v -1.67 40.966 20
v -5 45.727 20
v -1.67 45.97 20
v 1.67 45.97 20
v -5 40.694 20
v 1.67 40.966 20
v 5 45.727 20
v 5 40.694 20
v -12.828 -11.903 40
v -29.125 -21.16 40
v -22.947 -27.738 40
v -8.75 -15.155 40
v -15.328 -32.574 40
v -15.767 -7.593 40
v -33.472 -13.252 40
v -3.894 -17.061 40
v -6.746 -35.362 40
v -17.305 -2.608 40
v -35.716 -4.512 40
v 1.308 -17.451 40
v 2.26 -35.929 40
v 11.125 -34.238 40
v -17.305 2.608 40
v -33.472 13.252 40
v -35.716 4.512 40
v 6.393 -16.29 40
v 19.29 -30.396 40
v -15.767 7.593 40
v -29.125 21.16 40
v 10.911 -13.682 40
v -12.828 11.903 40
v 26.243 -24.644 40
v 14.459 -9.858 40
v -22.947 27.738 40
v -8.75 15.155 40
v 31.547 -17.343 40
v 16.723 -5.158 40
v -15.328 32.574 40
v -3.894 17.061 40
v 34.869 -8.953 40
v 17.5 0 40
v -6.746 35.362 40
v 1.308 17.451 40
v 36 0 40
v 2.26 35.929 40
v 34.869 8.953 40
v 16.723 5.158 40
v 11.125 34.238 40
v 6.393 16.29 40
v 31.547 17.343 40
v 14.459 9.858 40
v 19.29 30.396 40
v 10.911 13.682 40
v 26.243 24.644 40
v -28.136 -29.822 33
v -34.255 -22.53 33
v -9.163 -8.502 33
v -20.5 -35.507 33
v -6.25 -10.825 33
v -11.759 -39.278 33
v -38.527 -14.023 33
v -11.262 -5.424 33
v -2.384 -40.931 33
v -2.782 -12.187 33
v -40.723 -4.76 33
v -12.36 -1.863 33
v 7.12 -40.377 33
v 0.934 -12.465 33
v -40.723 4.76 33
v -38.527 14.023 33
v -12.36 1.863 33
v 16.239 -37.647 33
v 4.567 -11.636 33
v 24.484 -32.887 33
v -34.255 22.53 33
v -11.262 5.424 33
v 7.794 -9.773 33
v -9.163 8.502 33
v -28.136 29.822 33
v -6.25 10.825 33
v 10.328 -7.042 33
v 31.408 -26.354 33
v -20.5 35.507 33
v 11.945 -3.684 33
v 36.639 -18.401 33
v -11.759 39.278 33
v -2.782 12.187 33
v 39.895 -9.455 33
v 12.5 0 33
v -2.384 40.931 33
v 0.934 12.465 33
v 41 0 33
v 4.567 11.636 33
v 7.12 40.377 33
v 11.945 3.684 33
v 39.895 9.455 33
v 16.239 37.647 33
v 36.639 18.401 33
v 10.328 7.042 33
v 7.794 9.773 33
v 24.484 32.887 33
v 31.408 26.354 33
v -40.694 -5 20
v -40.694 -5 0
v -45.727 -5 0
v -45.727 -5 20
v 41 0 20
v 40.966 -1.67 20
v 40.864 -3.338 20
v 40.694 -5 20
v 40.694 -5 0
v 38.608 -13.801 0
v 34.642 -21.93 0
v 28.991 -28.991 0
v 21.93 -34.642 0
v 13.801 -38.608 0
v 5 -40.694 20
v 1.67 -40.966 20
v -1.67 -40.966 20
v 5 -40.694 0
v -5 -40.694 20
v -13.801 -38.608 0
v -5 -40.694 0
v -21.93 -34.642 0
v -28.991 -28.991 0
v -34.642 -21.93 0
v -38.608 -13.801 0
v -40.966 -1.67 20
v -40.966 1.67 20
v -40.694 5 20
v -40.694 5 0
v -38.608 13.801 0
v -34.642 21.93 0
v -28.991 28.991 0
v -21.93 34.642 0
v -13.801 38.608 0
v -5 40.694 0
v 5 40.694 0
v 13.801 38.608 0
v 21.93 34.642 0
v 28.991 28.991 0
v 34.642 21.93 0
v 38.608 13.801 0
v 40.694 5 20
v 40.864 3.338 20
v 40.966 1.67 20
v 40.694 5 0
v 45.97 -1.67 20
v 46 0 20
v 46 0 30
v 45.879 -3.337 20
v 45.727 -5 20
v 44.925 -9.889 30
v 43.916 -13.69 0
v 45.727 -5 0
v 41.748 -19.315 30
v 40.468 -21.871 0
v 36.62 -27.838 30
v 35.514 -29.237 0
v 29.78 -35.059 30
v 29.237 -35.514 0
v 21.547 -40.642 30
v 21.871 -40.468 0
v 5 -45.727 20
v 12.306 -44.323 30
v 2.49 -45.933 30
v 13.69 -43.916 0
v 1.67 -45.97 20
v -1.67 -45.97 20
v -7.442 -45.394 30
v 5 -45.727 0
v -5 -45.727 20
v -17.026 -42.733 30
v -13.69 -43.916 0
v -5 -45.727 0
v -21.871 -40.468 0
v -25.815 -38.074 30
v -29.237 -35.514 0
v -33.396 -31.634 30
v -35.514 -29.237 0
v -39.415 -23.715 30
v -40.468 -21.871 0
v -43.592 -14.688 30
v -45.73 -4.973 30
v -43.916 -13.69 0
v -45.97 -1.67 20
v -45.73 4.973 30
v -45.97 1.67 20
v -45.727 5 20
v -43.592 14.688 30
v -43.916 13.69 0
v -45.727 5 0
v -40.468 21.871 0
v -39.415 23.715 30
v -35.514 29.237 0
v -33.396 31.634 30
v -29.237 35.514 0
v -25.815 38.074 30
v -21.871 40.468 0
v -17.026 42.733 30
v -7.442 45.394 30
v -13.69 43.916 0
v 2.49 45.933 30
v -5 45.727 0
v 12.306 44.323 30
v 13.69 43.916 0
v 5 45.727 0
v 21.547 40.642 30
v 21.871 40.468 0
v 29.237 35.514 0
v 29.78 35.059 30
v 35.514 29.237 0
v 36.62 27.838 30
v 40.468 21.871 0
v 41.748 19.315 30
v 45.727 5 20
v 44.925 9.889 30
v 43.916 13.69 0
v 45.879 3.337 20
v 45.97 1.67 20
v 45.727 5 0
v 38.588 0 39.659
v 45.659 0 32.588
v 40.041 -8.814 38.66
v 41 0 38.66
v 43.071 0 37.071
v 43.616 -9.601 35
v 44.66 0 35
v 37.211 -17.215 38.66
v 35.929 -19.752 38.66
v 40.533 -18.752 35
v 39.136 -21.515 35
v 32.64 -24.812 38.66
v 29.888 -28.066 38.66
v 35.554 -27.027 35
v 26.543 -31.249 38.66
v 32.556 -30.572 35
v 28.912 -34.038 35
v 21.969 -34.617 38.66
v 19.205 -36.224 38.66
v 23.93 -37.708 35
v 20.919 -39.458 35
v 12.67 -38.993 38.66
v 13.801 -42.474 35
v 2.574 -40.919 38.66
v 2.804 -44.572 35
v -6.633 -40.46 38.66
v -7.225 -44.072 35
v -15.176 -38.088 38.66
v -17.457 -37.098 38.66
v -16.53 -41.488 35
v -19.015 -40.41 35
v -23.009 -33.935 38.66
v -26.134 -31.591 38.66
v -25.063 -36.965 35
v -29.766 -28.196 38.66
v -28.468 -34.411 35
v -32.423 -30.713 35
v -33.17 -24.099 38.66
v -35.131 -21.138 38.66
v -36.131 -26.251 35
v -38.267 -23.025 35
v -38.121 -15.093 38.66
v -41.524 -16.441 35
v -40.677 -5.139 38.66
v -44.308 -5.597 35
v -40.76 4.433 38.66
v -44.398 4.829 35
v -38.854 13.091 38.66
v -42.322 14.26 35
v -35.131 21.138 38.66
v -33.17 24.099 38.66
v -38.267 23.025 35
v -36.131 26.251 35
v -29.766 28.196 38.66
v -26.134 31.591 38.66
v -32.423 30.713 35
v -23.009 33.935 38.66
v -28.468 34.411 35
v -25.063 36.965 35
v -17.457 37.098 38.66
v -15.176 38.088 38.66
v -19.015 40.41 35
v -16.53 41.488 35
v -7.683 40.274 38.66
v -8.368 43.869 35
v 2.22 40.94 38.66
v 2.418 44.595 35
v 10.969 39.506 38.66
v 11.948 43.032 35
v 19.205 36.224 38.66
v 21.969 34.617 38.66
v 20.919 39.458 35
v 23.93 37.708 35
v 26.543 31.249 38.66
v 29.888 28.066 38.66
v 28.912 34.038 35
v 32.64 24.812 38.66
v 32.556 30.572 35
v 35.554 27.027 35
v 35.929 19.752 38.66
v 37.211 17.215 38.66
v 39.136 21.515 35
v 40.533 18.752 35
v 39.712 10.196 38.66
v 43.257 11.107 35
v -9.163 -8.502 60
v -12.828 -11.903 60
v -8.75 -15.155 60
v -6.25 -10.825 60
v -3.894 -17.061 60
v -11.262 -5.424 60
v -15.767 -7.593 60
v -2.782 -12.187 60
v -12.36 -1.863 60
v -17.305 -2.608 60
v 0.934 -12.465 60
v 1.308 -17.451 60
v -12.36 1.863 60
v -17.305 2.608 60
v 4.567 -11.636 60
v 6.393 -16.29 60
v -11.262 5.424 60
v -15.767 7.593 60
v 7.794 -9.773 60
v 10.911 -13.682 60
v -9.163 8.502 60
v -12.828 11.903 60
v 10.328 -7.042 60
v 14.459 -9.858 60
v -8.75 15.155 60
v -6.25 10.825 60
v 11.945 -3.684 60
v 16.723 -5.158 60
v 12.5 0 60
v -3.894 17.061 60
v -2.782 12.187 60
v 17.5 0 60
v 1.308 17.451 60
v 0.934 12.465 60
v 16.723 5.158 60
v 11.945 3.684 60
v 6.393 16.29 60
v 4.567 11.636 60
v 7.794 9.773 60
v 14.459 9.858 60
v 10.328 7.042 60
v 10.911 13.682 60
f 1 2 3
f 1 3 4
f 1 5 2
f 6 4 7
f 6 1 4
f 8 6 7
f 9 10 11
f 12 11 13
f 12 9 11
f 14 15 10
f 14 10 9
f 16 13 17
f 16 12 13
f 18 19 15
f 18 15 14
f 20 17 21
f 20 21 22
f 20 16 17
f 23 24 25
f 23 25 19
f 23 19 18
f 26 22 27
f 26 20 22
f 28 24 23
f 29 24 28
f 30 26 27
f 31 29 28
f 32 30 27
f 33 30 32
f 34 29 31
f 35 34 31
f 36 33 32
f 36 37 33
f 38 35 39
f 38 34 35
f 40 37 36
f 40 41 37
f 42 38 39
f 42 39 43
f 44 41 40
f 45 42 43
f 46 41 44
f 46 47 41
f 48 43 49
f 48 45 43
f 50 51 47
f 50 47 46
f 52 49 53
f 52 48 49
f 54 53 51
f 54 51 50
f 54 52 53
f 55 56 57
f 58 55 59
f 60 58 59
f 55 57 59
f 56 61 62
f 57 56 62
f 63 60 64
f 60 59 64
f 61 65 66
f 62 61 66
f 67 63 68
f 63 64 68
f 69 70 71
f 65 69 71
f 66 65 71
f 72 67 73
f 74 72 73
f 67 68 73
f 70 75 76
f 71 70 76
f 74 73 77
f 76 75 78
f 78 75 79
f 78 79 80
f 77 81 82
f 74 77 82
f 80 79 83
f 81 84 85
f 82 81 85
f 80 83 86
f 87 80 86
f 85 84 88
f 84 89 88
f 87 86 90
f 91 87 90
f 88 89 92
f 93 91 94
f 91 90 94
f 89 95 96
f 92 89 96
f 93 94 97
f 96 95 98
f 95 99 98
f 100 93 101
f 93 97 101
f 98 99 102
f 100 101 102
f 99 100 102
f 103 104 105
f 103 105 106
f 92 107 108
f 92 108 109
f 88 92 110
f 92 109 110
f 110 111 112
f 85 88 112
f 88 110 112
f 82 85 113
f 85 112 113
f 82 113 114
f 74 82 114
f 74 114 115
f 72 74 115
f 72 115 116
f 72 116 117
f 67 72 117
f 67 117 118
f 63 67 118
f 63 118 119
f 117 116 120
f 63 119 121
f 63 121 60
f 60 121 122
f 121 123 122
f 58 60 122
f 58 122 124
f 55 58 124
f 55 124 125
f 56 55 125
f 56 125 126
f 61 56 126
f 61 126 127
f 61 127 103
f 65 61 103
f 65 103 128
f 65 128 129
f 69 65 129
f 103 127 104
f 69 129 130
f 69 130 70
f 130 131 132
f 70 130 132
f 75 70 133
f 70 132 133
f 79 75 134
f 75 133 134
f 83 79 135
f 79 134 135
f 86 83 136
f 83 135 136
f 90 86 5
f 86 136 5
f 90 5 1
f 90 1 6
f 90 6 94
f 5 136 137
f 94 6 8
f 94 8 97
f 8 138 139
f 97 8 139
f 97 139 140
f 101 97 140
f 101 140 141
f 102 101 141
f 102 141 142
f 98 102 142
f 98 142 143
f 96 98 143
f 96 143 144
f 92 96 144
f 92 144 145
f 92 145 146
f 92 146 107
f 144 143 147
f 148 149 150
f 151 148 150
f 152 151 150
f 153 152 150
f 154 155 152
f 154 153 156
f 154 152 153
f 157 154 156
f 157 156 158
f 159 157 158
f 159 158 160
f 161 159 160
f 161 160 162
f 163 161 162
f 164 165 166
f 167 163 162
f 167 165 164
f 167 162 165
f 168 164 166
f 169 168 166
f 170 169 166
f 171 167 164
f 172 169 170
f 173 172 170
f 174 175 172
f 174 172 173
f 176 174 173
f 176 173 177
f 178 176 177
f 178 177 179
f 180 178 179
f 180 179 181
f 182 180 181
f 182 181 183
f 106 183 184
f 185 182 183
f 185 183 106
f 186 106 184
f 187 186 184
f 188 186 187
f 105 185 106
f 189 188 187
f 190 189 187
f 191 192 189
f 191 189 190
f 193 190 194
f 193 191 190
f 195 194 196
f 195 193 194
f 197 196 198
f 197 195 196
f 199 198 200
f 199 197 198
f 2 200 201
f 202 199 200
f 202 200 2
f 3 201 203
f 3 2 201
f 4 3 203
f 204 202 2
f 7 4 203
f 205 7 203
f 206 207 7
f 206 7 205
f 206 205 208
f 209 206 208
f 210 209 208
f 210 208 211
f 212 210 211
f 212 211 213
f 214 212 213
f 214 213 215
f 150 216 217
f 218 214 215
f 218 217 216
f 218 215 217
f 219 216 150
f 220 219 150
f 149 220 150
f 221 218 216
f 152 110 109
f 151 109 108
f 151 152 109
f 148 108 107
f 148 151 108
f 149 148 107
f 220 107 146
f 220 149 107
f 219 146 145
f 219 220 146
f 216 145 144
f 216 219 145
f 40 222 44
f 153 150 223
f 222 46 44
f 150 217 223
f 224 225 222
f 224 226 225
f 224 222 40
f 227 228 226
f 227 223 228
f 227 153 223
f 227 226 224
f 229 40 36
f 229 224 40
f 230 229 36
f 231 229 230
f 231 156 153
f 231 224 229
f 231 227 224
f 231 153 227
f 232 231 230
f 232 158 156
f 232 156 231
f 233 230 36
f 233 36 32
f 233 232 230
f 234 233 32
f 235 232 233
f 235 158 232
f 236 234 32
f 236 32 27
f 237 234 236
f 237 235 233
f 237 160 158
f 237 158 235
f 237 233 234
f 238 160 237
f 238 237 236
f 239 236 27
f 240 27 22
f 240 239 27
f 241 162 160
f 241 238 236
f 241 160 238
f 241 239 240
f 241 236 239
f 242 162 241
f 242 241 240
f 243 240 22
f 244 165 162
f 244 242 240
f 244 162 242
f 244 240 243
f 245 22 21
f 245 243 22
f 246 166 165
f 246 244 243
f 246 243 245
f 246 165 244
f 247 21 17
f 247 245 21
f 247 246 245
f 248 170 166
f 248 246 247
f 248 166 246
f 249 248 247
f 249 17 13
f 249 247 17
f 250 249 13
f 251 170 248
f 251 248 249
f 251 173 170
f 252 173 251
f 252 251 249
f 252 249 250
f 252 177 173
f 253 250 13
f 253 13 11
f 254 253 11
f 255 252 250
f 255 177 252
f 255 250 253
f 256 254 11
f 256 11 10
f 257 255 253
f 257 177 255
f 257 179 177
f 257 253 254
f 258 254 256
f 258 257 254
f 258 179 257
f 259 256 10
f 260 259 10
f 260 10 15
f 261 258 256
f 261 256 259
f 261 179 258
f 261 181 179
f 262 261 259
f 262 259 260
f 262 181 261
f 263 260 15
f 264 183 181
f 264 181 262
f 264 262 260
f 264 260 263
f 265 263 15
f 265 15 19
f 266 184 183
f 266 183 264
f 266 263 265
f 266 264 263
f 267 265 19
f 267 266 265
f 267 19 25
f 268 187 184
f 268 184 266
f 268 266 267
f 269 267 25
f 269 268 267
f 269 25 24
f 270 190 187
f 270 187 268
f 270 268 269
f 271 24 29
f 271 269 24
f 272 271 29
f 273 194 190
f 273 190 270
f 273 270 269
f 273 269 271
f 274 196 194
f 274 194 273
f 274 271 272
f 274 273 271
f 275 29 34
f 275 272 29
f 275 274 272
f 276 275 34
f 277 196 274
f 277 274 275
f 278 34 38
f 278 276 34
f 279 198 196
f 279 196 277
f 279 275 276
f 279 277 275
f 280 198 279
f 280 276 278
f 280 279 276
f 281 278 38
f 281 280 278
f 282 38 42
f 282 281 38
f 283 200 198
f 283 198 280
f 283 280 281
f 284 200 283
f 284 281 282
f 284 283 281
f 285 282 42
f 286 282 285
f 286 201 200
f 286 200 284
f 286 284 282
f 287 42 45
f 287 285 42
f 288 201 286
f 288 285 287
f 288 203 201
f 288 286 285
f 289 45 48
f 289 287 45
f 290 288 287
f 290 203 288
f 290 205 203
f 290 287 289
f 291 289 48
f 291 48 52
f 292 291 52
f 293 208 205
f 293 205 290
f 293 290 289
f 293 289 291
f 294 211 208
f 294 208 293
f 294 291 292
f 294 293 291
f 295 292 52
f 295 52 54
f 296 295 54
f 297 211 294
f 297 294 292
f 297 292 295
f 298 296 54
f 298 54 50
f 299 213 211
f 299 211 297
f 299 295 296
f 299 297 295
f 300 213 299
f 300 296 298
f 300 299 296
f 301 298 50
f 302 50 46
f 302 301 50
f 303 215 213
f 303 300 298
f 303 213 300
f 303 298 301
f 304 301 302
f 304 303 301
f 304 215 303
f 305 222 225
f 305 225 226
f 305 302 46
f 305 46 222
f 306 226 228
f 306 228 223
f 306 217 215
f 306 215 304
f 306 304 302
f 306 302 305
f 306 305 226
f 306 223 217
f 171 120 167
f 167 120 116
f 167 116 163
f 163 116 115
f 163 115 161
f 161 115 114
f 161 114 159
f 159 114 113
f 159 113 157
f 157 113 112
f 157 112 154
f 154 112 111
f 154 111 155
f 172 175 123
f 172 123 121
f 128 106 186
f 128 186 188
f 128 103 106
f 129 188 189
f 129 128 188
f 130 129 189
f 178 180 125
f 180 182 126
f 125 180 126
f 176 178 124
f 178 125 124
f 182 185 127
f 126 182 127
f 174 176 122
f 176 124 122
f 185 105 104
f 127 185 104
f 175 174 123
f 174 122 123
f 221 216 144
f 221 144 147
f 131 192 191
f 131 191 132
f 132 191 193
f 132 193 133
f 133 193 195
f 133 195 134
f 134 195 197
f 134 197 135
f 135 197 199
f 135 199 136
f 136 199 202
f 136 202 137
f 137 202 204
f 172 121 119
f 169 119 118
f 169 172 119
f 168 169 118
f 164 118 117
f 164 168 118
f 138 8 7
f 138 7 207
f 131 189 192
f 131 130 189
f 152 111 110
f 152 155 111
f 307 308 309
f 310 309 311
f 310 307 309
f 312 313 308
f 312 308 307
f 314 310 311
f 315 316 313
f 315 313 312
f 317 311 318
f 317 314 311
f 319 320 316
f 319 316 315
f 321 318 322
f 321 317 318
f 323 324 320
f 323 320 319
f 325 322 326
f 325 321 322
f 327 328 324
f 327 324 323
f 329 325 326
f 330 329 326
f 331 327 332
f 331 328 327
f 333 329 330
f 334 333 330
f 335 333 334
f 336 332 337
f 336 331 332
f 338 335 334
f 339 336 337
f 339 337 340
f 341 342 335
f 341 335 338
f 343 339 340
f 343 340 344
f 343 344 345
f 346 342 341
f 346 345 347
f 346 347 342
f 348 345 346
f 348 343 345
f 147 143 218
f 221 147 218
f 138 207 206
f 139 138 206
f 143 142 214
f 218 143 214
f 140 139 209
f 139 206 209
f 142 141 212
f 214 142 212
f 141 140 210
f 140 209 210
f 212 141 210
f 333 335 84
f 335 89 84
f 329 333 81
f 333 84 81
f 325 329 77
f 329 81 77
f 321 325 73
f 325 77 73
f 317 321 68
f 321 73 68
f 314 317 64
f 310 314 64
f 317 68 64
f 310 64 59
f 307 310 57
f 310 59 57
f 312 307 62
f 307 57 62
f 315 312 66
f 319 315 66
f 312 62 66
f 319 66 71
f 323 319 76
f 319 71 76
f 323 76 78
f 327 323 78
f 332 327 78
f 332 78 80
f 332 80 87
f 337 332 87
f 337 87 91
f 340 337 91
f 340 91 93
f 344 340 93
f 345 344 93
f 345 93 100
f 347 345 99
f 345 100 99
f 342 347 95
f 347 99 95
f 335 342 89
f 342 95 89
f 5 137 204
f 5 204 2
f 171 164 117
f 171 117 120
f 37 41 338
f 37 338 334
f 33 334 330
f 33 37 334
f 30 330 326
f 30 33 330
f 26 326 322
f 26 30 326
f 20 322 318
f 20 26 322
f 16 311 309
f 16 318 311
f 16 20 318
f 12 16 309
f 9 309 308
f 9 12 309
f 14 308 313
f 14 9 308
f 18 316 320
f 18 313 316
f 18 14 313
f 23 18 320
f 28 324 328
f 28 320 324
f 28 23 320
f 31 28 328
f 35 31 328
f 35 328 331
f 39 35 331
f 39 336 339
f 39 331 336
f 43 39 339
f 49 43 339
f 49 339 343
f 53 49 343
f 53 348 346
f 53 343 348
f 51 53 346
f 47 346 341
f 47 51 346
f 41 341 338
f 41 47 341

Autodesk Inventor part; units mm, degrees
ref_plane "XY Plane" through (0, 0, 0) normal (0, 0, 1) x (1, 0, 0)
sketch "Sketch1" plane through (0, 0, 0) normal (0, 0, 1) x (1, 0, 0)
  circle A0 centre (0, 0) radius 41
  circle A1 centre (0, 0) radius 12.5
  circle A2 centre (0, 0) radius 46
  dimension "d0" = 82
  dimension "d1" = 25
  dimension "d2" = 92
extrude "Extrusion1" add sketch "Sketch1" along normal blind 40 contours A0 | A2
fillet "Fillet1" radius 10 1 edges at (-46, 0, 40)
extrude "Extrusion2" cut sketch "Sketch1" along normal blind 33 contours A0
sketch "Sketch2" plane through (0, 0, 40) normal (0, 0, 1) x (1, 0, 0)
  circle A0 centre (0, 0) radius 17.5
  dimension "d8" = 35
extrude "Extrusion3" add sketch "Sketch2" along normal blind 20
extrude "Extrusion4" cut sketch "Sketch1" along normal blind 118.5 contours A1
thread "Thread1" size "M95x6" class "6g" standard "ANSI Metric M Profile" full length
ref_plane "Work Plane1" through (0, -46, 0) normal (0, 1, 0) x (-1, 0, 0)
ref_plane "Work Plane2" through (46, 0, 0) normal (1, 0, 0) x (0, 1, 0)
sketch "Sketch3" plane through (0, -46, 0) normal (0, 1, 0) x (-1, 0, 0)
  line L0 (5, 20) -> (-5, 20)
  line L1 (-5, 20) -> (-5, -20)
  line L2 (-5, -20) -> (5, -20)
  line L3 (5, -20) -> (5, 20)
  line L4 (5, 20) -> (-5, -20) construction
  line L5 (-5, 20) -> (5, -20) construction
  point P0 (0, 0)
  dimension "d15" = 10
  dimension "d16" = 40
extrude "Extrusion5" cut sketch "Sketch3" along normal blind 154.5
sketch "Sketch4" plane through (46, 0, 0) normal (1, 0, 0) x (0, 1, 0)
  line L0 (-5, 20) -> (5, 20)
  line L1 (5, 20) -> (5, -20)
  line L2 (5, -20) -> (-5, -20)
  line L3 (-5, -20) -> (-5, 20)
  line L4 (-5, 20) -> (5, -20) construction
  line L5 (5, 20) -> (-5, -20) construction
  point P0 (0, 0)
  dimension "d19" = 10
  dimension "d20" = 40
extrude "Extrusion6" cut sketch "Sketch4" against normal blind 154.5
properties part number "input"
